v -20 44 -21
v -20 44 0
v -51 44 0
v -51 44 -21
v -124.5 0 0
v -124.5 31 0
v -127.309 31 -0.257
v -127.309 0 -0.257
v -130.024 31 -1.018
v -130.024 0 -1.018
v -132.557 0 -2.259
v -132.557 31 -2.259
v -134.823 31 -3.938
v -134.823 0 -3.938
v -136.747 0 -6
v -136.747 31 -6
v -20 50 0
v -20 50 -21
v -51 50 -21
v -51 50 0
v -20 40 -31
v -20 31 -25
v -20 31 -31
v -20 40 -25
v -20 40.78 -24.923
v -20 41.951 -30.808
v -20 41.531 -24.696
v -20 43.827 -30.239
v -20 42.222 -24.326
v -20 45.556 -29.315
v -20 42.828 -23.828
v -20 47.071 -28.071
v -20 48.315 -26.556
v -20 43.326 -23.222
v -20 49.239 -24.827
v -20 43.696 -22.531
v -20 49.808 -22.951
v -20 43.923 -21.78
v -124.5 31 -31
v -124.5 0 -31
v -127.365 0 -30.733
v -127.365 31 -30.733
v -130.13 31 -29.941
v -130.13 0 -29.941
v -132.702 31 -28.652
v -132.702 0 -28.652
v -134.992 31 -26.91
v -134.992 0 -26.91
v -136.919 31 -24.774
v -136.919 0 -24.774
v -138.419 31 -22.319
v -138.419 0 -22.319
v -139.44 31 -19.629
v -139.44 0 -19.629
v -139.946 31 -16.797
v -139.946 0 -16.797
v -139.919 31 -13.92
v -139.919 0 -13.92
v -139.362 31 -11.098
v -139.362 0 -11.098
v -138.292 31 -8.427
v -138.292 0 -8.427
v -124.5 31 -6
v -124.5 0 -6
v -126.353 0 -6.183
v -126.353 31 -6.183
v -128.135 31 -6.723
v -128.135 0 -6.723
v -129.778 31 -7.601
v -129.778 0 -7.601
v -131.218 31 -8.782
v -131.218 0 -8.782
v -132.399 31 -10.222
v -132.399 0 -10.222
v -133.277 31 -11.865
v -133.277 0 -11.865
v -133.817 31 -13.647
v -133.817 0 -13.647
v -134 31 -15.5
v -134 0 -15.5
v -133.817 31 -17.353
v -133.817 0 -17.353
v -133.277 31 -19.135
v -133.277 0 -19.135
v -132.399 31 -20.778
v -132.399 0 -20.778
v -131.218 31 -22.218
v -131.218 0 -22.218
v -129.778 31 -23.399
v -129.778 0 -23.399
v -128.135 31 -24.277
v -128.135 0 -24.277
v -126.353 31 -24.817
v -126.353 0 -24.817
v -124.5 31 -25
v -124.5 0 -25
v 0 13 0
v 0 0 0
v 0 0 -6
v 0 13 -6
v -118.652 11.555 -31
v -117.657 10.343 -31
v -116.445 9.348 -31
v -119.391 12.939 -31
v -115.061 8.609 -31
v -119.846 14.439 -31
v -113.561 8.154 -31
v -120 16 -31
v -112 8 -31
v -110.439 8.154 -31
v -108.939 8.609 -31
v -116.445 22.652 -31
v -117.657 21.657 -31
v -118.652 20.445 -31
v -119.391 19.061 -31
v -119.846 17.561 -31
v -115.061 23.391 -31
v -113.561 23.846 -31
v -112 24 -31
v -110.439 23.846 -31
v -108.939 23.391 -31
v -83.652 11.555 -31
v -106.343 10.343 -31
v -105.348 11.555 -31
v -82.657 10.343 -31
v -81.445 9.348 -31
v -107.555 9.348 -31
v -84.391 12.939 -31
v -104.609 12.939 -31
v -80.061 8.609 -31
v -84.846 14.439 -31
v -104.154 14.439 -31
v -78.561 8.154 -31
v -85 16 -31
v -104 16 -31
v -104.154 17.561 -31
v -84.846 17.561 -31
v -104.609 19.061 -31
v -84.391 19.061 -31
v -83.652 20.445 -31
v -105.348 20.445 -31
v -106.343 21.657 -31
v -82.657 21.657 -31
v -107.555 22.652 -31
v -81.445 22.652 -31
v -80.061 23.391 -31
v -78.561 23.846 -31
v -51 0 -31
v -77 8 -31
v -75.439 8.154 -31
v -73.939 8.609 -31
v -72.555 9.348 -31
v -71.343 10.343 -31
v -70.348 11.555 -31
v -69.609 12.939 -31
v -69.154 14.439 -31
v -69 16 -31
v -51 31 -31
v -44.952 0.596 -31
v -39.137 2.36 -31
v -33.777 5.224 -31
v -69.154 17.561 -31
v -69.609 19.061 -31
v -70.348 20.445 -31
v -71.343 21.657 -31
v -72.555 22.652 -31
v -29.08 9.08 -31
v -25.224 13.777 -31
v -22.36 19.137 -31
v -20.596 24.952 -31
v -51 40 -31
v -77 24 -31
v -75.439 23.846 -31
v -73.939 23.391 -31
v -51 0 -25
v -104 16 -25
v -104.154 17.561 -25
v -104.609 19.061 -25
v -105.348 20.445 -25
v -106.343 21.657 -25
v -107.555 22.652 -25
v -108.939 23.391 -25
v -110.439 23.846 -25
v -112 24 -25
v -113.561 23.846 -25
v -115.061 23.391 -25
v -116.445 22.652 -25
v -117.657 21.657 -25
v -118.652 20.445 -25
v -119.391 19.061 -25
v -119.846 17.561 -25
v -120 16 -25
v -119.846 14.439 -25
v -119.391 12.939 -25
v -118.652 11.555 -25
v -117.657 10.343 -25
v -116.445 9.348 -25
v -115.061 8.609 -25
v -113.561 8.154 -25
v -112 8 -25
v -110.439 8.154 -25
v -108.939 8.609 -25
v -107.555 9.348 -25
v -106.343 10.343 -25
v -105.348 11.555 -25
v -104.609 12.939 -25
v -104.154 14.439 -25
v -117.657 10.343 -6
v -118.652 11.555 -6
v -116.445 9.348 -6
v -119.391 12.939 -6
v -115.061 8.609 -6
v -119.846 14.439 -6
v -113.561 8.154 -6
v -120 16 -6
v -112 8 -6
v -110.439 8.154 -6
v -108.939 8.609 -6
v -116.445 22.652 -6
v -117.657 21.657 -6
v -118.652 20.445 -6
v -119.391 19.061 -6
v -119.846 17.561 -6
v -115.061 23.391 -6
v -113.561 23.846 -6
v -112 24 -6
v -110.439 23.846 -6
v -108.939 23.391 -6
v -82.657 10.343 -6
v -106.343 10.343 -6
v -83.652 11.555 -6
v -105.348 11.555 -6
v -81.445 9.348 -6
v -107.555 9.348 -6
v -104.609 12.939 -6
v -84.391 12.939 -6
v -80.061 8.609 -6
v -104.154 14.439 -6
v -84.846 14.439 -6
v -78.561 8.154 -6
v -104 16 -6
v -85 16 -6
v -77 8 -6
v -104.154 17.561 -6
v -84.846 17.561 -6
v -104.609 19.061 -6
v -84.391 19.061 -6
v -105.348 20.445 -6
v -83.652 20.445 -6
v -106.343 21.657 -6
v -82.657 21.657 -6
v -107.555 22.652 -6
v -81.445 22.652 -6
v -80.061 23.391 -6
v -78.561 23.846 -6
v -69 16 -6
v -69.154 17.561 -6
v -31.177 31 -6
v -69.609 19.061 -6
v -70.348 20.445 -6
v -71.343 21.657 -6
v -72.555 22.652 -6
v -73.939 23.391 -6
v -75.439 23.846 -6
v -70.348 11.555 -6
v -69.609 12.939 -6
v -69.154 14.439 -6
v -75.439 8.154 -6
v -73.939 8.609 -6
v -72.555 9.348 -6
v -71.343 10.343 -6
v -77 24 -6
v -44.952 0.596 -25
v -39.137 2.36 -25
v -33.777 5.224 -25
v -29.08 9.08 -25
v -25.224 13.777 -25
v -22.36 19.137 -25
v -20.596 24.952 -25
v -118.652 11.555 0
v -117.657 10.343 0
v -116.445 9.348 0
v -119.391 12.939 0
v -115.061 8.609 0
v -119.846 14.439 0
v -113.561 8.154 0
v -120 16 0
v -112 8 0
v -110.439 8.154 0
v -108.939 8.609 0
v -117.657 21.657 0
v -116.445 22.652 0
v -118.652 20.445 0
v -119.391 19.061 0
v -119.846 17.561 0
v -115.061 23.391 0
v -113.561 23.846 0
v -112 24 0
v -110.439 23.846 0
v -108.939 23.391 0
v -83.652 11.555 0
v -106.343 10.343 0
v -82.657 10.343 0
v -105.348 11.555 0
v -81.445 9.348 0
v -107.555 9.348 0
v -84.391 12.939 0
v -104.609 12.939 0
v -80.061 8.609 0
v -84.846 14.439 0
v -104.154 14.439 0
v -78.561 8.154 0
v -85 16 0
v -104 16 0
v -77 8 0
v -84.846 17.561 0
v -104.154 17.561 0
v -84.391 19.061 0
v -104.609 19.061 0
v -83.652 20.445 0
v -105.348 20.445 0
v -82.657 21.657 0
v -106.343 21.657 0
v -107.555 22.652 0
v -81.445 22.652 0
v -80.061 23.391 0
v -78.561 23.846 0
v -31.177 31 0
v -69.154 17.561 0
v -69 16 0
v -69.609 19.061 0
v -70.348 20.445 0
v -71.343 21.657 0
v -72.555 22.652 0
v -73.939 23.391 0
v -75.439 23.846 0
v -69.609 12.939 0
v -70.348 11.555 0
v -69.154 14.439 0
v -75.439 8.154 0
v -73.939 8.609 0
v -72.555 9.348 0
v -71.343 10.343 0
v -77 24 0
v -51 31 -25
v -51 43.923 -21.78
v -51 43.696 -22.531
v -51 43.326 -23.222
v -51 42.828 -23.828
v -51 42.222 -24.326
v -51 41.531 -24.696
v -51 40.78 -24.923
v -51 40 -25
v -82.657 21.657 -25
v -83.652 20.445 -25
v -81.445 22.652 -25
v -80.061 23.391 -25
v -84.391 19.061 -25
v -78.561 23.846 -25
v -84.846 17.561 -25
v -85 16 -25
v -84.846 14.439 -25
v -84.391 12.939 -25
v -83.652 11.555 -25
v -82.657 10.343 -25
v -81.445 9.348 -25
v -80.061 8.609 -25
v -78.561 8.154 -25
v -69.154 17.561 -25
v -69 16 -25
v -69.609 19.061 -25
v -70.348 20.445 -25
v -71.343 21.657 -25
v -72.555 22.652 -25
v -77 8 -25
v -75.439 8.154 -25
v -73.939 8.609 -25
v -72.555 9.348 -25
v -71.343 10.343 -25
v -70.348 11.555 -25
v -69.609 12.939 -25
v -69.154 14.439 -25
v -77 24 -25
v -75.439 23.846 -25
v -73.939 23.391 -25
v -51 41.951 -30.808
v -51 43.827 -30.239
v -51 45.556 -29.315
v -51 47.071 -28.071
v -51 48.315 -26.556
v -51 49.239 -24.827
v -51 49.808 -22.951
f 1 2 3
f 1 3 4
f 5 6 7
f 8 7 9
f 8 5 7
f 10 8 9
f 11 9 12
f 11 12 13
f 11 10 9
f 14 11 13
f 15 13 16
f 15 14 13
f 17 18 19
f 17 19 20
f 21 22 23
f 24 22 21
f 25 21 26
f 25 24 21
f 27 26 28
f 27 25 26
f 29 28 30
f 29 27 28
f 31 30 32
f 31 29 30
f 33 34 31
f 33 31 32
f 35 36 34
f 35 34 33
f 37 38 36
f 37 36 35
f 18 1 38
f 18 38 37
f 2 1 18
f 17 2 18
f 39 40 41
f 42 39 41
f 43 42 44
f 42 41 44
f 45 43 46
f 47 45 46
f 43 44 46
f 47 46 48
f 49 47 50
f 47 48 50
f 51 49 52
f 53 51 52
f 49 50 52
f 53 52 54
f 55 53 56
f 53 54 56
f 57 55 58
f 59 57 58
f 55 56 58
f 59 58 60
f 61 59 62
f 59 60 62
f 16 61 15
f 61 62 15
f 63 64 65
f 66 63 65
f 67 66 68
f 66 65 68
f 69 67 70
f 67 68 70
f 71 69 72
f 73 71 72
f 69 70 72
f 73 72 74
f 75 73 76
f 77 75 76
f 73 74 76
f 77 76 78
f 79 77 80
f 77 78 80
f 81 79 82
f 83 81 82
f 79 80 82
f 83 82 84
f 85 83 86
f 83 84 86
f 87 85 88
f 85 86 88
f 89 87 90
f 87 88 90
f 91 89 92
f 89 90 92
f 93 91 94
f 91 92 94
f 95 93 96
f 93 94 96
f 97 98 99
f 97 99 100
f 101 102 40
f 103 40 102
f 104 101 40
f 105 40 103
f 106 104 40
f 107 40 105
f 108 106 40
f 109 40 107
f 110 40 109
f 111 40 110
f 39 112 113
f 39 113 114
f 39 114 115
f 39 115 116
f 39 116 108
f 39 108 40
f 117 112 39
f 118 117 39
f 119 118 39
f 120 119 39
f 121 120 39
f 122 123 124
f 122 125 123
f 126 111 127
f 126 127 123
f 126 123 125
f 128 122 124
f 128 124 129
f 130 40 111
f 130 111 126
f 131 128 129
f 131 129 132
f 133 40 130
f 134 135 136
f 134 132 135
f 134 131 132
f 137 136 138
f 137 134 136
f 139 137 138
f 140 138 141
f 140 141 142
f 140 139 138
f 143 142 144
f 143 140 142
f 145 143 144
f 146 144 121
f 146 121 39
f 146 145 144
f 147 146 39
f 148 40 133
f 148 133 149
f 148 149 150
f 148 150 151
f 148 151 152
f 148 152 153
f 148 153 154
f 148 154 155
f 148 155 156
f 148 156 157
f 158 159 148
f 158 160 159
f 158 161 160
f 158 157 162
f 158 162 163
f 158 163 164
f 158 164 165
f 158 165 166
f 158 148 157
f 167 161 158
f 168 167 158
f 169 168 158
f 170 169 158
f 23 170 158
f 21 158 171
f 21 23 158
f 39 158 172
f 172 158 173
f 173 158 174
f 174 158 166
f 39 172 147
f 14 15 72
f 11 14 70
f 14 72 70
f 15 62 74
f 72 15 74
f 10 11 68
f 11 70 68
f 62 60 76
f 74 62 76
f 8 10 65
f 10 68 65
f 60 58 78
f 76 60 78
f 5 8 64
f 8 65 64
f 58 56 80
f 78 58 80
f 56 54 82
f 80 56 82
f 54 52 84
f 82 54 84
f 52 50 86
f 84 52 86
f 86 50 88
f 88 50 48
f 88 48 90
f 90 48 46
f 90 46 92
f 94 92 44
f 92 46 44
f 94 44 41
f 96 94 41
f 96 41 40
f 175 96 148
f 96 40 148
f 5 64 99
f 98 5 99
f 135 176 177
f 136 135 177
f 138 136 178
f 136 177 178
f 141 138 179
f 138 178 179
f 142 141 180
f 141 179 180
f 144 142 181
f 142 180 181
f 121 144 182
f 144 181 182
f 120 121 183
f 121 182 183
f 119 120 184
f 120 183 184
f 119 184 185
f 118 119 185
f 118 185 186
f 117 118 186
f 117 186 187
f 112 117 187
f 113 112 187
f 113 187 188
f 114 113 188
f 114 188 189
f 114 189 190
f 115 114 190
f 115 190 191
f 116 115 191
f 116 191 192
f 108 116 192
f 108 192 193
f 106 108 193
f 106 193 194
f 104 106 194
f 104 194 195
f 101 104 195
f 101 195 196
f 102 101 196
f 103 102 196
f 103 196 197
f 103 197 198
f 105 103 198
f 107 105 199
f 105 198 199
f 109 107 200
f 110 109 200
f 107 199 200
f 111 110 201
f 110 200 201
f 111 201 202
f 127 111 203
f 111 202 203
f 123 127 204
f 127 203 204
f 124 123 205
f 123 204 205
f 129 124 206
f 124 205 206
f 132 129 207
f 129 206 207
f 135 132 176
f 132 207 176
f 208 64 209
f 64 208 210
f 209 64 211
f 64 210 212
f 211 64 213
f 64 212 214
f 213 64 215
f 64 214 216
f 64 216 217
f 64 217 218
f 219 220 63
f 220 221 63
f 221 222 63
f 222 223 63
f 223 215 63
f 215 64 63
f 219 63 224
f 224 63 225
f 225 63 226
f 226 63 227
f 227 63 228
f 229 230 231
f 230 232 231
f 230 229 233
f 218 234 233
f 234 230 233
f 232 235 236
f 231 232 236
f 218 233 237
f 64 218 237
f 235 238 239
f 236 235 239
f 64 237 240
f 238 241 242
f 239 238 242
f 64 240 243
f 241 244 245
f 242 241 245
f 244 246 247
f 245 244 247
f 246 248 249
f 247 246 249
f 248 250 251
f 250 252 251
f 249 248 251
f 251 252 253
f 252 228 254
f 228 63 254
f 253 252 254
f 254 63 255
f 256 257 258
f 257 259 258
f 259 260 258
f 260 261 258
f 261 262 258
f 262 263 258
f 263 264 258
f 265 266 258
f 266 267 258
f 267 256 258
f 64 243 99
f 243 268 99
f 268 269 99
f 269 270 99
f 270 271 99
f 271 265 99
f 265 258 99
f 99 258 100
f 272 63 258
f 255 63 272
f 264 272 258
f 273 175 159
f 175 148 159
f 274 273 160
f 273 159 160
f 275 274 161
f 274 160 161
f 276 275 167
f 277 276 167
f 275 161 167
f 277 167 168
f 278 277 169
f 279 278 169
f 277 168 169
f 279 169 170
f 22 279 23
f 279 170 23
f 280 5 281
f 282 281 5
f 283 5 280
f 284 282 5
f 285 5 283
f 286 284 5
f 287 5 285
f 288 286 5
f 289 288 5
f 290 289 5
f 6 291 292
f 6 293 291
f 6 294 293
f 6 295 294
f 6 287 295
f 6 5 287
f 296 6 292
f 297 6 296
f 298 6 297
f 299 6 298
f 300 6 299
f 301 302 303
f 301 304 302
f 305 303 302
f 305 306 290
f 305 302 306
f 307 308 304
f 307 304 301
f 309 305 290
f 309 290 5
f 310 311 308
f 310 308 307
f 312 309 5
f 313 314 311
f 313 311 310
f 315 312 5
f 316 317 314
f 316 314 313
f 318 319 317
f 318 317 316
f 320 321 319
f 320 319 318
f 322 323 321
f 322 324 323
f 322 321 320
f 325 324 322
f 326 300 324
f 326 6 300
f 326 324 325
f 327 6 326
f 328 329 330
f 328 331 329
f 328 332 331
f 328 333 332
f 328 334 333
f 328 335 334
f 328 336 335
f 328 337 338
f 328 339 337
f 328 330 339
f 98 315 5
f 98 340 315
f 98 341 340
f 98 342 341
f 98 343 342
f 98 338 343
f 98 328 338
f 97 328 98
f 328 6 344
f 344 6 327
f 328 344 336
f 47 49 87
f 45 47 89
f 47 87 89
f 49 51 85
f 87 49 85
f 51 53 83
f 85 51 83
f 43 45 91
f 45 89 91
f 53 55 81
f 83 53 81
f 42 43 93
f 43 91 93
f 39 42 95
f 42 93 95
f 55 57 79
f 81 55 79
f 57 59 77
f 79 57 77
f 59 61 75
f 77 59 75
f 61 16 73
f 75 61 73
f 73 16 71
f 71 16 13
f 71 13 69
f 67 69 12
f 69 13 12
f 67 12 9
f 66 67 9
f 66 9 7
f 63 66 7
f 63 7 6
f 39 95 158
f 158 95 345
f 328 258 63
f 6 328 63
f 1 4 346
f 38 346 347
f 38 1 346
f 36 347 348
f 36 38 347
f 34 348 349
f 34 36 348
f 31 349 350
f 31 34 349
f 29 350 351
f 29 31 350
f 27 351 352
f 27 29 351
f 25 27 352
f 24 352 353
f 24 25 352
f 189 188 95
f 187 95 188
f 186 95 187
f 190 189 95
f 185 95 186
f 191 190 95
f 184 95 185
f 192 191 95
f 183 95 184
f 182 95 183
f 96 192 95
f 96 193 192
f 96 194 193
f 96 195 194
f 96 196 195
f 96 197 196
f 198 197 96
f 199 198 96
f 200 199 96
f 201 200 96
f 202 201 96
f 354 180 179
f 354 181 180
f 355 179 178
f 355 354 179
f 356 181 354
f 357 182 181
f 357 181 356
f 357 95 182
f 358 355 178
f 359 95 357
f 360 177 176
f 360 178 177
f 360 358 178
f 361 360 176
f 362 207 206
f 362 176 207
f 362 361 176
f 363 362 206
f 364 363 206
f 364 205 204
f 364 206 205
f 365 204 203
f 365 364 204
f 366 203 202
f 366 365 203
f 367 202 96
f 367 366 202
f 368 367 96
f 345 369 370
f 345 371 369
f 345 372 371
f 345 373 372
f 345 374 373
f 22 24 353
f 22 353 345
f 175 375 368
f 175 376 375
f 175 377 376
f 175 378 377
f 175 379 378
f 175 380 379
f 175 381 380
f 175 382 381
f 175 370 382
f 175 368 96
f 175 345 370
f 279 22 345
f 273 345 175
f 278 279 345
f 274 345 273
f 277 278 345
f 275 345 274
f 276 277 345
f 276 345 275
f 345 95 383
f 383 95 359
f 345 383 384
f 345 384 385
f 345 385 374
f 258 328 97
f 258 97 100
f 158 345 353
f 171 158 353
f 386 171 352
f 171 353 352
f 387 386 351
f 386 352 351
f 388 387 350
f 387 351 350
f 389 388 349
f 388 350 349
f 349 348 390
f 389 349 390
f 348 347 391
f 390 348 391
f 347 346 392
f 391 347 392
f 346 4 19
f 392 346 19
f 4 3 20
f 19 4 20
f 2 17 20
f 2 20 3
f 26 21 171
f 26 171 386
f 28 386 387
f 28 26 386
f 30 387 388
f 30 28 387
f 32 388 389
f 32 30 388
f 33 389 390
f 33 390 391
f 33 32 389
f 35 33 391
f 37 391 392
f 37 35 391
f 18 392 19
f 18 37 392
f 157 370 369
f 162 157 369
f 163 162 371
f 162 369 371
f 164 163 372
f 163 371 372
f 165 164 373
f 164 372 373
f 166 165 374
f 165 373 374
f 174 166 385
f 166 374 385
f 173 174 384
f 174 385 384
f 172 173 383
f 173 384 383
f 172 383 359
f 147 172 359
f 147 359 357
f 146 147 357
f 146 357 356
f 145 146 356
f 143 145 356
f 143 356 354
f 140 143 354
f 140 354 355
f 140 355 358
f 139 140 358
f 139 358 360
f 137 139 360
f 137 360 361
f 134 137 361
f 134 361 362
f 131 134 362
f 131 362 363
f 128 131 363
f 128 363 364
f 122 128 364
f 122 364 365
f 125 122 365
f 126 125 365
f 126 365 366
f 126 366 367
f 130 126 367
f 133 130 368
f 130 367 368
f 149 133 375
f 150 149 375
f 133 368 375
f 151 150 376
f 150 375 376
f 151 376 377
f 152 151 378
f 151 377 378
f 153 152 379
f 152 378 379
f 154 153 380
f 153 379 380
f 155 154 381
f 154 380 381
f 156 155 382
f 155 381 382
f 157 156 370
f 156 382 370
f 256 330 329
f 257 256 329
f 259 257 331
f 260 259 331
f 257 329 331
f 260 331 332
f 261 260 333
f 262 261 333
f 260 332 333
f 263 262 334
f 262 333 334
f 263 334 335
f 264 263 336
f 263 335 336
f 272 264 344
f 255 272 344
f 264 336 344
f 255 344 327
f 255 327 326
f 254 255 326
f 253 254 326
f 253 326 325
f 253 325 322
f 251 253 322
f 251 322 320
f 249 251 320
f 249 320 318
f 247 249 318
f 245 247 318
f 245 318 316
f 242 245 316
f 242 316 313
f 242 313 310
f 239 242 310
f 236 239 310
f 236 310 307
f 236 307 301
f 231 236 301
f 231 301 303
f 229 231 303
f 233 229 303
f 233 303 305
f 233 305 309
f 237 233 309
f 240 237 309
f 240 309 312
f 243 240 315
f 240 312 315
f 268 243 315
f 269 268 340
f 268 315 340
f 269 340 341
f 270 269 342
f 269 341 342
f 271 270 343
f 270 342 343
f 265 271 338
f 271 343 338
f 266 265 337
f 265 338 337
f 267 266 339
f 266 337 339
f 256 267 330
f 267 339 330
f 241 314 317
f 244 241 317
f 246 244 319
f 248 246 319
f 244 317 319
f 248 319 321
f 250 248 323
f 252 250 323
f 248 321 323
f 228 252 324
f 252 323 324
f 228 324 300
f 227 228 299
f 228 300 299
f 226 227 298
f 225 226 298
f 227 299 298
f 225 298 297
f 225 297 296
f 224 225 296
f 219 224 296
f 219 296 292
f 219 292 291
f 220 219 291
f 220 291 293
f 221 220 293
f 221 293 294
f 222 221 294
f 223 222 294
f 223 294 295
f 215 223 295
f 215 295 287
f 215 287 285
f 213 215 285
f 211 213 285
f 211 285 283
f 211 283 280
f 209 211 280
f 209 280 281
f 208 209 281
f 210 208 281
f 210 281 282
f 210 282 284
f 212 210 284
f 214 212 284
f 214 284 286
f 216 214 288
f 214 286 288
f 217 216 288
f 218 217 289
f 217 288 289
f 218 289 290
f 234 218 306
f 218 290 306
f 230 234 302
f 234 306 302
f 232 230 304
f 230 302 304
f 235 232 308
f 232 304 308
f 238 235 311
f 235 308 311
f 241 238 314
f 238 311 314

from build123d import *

# Parameters (mm, degrees)
SKETCH_1_W             = 140
SKETCH_1_H             = 31
SM_BASE_FLANGE_1_DEPTH = 6
OTHER_1_DEPTH          = 31
OTHER_1_2_DEPTH        = 31
SM_EDGE_FLANGE_1_DEPTH = 104.5
SKETCH_21_W            = 73.5
SKETCH_21_H            = 19
CUT_EXTRUDE_1_DEPTH    = 152.858486756
SKETCH_22_R            = 8
CUT_EXTRUDE_2_DEPTH    = 152.858486756
CHAMFER_1_SIZE         = 18
CHAMFER_1_SIZE2        = 31.176914536
FILLET_1_R             = 31


# Read off the part's stored shape, not the designer's step: 褶边1
# Sheet-metal steps are written as plain solids
with BuildPart() as part:
    # Sketch 1 → 基体-法兰1 (new body)
    with BuildSketch(Plane.XY):
        with Locations((-70, 15.5)):
            Rectangle(SKETCH_1_W, SKETCH_1_H)
    extrude(amount=-SM_BASE_FLANGE_1_DEPTH)

    # Other 1 outline → Other 1 (cut)
    with BuildSketch(Plane(origin=(0, 0, 0), x_dir=(1, 0, 0), z_dir=(0, 1, 0))):
        with BuildLine():
            ThreePointArc((-124.5, 0), (-131.319090848, 1.580589093), (-136.747448714, 6))
            Line((-136.747448714, 6), (-140, 6))
            Line((-140, 6), (-140, 0))
            Line((-140, 0), (-124.5, 0))
        make_face()
    extrude(amount=OTHER_1_DEPTH, mode=Mode.SUBTRACT)

    # Other 1 2 outline → Other 1 2 (add)
    with BuildSketch(Plane(origin=(0, 0, 0), x_dir=(1, 0, 0), z_dir=(0, 1, 0))):
        with BuildLine():
            Line((-20, 25), (-20, 31))
            Line((-20, 31), (-124.5, 31))
            ThreePointArc((-124.5, 31), (-138.419410907, 22.319090848), (-136.747448714, 6))
            Line((-136.747448714, 6), (-124.5, 6))
            ThreePointArc((-124.5, 6), (-134, 15.5), (-124.5, 25))
            Line((-124.5, 25), (-20, 25))
        make_face()
    extrude(amount=OTHER_1_2_DEPTH)

    # 边线-法兰1 section (across the edge) → 边线-法兰1 (add)
    with BuildSketch(Plane(origin=(-20, 44, -25), x_dir=(0, -1, 0), z_dir=(-1, 0, 0))):
        with BuildLine():
            Line((-6, 4), (-6, 25))
            Line((-6, 25), (0, 25))
            Line((0, 25), (0, 4))
            ThreePointArc((0, 4), (1.171572875, 1.171572875), (4, 0))
            Line((4, 0), (13, 0))
            Line((13, 0), (13, -6))
            Line((13, -6), (4, -6))
            ThreePointArc((4, -6), (-3.071067812, -3.071067812), (-6, 4))
        make_face()
    extrude(amount=SM_EDGE_FLANGE_1_DEPTH)

    # 草图21 → 切除-拉伸1 (cut, through all)
    with BuildSketch(Plane.XY):
        with Locations((-87.75, 40.5)):
            Rectangle(SKETCH_21_W, SKETCH_21_H)
    extrude(amount=-CUT_EXTRUDE_1_DEPTH, mode=Mode.SUBTRACT)

    # 草图22 → 切除-拉伸2 (cut, through all)
    with BuildSketch(Plane.XY):
        with Locations((-112, 16)):
            Circle(SKETCH_22_R)
        with Locations((-77, 16)):
            Circle(SKETCH_22_R)
    extrude(amount=-CUT_EXTRUDE_2_DEPTH, mode=Mode.SUBTRACT)

    # 倒角1
    chamfer_1_edges = [part.edges().sort_by_distance(p)[0] for p in [
        (0, 31, -3),
    ]]
    chamfer_1_side = [part.faces().sort_by_distance(p)[0] for p in [
        (0, 15.5, -3),
    ]]
    chamfer(chamfer_1_edges, length=CHAMFER_1_SIZE, length2=CHAMFER_1_SIZE2, reference=chamfer_1_side[0])

    # 圆角1
    fillet_1_edges = [part.edges().sort_by_distance(p)[0] for p in [
        (-20, 0, -28),
    ]]
    fillet(fillet_1_edges, radius=FILLET_1_R)


solid = part.part
